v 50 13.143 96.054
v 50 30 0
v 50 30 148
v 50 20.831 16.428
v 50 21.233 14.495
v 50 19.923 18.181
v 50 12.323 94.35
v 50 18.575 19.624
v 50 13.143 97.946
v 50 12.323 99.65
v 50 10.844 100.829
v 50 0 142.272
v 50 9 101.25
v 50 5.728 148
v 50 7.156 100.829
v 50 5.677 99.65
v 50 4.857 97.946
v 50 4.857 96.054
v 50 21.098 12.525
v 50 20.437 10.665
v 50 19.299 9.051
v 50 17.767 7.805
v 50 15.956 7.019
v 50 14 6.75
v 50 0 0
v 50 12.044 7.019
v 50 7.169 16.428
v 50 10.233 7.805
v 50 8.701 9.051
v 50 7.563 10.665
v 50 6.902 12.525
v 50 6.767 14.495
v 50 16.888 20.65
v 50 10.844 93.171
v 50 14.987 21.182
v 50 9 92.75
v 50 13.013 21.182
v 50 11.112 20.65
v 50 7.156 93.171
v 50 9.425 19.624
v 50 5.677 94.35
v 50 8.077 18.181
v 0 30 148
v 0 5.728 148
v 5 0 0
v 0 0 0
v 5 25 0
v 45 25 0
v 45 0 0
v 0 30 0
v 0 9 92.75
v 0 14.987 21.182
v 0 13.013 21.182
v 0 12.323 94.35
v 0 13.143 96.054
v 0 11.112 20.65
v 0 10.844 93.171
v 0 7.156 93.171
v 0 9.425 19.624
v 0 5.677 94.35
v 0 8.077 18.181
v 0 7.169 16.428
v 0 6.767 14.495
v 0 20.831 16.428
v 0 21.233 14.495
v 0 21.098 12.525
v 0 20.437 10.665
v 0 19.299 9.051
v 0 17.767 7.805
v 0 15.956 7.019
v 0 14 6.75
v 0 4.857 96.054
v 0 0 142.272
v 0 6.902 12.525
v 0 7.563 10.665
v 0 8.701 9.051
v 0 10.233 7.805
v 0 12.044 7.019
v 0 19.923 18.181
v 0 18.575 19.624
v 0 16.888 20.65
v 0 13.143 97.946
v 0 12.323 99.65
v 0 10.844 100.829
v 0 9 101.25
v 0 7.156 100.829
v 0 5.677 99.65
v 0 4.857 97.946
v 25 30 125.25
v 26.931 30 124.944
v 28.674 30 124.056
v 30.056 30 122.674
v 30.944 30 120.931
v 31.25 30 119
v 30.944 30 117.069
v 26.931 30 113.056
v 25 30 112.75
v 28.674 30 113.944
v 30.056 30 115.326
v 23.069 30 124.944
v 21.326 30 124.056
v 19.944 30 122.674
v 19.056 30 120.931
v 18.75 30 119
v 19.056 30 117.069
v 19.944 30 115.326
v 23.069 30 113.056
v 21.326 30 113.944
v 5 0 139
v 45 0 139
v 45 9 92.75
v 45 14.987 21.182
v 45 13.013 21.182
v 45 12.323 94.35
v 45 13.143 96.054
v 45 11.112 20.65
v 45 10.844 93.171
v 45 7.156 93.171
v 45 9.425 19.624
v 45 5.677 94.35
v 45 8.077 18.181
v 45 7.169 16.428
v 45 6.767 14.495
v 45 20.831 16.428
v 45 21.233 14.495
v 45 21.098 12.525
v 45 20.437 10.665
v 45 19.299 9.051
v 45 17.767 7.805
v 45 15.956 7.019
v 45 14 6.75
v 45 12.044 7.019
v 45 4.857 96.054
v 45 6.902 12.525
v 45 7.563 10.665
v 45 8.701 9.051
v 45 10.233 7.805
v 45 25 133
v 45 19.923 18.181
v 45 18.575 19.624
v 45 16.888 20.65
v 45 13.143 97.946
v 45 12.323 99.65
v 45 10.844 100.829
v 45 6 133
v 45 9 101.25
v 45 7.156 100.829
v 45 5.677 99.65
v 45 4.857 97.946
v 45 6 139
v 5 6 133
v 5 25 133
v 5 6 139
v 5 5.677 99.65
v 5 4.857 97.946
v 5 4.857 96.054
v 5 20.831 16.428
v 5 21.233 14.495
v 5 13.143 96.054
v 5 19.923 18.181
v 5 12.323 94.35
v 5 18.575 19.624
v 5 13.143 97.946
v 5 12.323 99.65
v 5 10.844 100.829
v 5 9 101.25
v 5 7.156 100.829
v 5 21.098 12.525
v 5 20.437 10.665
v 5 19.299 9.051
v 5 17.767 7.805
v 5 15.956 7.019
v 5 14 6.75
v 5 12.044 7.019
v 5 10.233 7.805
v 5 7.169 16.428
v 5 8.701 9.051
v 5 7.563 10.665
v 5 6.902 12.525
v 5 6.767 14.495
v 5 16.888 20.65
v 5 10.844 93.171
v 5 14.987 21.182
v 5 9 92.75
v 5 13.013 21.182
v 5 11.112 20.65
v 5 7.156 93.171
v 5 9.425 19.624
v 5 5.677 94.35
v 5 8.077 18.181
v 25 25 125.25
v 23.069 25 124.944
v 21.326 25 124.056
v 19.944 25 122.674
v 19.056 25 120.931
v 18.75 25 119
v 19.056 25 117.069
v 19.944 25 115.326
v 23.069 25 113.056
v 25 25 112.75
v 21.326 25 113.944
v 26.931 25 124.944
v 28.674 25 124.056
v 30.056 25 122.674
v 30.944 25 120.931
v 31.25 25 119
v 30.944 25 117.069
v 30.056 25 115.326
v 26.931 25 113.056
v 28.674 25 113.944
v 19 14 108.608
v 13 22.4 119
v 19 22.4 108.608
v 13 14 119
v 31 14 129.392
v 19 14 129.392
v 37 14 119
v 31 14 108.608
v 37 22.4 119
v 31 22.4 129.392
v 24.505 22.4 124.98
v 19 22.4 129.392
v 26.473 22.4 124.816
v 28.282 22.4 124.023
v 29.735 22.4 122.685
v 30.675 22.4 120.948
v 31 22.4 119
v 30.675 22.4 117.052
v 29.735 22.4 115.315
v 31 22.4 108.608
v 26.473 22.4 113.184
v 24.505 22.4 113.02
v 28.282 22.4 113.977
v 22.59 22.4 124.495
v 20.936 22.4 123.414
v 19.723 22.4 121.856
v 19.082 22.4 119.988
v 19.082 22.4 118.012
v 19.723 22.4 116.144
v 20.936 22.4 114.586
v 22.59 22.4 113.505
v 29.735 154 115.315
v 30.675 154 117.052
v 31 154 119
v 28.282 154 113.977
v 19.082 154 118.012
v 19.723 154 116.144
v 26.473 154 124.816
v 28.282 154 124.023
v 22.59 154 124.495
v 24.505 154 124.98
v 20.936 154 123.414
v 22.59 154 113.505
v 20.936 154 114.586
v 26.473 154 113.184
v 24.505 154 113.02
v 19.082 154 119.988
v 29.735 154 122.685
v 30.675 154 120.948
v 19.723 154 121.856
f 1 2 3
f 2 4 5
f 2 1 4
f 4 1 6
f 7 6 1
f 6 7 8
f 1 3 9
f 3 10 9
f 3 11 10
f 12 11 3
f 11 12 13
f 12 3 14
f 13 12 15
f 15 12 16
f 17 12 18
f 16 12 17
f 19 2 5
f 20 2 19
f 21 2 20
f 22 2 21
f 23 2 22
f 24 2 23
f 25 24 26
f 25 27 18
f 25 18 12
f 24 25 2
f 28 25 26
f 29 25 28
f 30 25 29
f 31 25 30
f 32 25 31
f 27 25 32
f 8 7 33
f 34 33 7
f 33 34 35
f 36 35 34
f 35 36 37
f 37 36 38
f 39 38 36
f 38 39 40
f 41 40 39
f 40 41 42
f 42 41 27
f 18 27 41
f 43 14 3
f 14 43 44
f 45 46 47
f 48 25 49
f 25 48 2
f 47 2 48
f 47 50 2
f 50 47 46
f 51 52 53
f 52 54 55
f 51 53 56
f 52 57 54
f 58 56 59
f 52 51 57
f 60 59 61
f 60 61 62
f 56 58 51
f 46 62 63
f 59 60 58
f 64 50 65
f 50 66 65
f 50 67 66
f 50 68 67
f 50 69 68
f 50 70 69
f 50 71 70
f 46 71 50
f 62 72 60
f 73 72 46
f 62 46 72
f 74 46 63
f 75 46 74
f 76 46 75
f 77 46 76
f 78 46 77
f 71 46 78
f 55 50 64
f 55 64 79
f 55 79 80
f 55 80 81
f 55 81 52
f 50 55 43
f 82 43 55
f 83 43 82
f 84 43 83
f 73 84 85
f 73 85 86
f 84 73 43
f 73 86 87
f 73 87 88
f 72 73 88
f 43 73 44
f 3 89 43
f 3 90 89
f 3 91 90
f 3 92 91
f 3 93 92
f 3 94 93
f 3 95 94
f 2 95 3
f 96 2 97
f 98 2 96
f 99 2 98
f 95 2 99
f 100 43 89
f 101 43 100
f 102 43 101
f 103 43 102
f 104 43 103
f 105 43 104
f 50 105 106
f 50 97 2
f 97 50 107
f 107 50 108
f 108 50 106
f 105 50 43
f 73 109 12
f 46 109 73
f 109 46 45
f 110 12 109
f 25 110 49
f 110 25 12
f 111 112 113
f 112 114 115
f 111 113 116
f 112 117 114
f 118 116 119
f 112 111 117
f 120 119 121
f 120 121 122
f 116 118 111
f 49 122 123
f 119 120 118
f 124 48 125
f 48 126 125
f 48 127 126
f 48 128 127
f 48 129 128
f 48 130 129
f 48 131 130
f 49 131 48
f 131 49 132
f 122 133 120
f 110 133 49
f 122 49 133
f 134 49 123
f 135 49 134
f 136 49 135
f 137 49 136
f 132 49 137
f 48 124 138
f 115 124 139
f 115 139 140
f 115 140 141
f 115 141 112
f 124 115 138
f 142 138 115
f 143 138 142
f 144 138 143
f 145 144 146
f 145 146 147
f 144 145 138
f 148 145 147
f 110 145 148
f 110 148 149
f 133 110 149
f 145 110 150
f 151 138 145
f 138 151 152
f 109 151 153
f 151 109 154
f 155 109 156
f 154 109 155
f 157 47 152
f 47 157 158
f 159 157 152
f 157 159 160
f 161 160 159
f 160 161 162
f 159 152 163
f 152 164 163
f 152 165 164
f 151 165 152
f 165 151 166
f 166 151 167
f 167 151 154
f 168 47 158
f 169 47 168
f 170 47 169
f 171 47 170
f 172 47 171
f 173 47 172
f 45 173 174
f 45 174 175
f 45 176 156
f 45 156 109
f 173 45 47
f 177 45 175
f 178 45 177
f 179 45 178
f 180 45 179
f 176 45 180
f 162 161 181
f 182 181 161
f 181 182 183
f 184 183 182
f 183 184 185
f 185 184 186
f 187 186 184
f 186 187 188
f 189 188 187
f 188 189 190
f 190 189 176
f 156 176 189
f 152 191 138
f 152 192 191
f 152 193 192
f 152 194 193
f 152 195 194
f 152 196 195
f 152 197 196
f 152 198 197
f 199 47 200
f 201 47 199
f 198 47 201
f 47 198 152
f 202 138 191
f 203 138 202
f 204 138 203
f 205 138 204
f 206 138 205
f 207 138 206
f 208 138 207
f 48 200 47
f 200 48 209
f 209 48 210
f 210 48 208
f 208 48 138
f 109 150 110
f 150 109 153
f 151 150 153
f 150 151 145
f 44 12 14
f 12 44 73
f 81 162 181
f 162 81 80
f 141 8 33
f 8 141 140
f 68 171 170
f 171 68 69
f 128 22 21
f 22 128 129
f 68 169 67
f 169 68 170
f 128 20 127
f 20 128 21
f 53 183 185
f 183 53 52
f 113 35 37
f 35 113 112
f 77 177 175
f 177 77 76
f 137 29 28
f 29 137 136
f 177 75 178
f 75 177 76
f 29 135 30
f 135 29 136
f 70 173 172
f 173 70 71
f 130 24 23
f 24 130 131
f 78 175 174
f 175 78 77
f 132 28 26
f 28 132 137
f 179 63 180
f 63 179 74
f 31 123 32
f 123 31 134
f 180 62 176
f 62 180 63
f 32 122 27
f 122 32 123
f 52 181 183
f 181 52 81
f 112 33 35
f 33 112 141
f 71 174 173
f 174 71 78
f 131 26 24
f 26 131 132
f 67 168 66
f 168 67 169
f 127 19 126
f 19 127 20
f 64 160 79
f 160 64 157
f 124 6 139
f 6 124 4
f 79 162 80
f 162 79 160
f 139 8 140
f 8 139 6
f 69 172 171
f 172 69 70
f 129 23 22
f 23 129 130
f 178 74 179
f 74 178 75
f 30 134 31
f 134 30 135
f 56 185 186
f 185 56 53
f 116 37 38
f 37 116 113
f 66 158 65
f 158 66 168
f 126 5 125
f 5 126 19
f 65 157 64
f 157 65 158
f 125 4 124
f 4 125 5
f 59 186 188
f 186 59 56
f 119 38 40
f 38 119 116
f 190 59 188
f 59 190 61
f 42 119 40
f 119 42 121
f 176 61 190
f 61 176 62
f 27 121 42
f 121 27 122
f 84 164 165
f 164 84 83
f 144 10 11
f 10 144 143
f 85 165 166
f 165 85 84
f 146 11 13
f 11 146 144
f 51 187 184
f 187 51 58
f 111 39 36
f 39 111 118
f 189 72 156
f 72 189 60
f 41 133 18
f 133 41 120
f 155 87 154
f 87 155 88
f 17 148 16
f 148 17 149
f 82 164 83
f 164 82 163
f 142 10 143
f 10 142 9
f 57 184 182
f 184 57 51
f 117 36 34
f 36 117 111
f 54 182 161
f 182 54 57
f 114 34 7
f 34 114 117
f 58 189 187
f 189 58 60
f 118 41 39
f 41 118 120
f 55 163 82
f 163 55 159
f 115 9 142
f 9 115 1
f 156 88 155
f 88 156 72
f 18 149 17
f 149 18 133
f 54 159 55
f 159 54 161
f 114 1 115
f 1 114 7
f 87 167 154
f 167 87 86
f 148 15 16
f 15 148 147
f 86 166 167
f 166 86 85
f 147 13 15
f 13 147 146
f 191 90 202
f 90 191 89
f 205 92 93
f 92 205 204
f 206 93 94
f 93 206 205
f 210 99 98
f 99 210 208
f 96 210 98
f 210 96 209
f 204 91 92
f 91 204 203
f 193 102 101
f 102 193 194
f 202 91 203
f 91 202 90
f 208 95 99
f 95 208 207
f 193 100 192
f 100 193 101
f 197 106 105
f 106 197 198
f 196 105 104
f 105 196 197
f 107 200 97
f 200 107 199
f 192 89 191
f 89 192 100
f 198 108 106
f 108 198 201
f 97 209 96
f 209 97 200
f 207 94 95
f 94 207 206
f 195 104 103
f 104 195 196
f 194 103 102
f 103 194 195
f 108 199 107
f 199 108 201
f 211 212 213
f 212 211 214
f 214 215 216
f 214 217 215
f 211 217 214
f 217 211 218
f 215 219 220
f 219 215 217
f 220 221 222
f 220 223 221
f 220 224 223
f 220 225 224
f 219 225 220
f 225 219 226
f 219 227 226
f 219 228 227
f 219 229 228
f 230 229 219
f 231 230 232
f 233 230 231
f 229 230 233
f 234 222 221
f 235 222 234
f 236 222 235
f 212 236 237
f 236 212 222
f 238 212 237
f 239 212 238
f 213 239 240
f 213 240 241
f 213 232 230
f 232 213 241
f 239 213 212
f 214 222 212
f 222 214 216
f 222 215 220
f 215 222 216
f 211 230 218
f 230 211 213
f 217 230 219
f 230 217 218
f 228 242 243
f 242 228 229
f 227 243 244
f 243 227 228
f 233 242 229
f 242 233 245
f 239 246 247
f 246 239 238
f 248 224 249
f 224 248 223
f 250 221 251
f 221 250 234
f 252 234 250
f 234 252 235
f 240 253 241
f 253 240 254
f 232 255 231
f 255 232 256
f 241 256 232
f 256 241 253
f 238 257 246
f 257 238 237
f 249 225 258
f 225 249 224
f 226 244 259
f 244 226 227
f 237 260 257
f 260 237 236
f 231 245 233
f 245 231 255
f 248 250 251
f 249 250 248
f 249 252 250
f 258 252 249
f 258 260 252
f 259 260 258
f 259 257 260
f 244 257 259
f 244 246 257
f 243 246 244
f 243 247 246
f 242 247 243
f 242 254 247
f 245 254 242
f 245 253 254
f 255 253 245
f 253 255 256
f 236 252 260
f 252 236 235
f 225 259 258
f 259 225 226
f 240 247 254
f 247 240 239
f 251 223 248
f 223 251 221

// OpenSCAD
// file: hexagonalprism.scad
hex_prism(6.2,6);



module hex_prism(r,h){
    linear_extrude(height=h){
        hex(r);
    }
}

module hex(r){
    polygon(points = [[r,0],[r/2,r*sqrt(3)/2],
                [-r/2,r*sqrt(3)/2],[-r,0],
                [-r/2,-r*sqrt(3)/2],[r/2,-r*sqrt(3)/2]]);
}
// file: bolts.scad
use <hexagonalprism.scad>

bolt();

translate([30,0,0]) nut();

module kingpin(){
    bolt(d=12.7,l=75);
}

module bolt(d=12.7,l=62){
    rad = d/2;
    len = l;
    color("gray") hex_prism(2*rad,rad*1.4);
    color("silver") cylinder(r=rad,h=len);
}

module nut(d=12.7){
    rad = d/2;
    color("gray") difference(){
        hex_prism(2*rad,rad*1.4);
        color("silver") cylinder(r=rad,rad*1.4+2);
    }
}
// main file
use <./bolts.scad>

tiltBrkt();

module tiltBrkt() color("lightgray"){
    difference(){
        cube([50,30,148]);
        translate([5,-5,-5]) cube([40,30,138]);
        translate([5,-24,0]) cube([40,30,139]);
        //translate([25,-7,0]) 
          //      rotate([45,0,0]) cube([52,18,18],center=true);
        translate([25,-7,148]) 
                rotate([45,0,0]) cube([52,18,18],center=true);
        translate([-1,14,14]) rotate([0,90,0]) cylinder(r=7.25,h=52);
        translate([-1,9,97]) rotate([0,90,0]) cylinder(r=4.25,h=52);
        translate([25,31,119]) rotate([90,0,0]) cylinder(r=6.25,h=32);
    }
    translate([25,14,119]) rotate([-90,0,0]) bolt(d=12,l=140);
}
